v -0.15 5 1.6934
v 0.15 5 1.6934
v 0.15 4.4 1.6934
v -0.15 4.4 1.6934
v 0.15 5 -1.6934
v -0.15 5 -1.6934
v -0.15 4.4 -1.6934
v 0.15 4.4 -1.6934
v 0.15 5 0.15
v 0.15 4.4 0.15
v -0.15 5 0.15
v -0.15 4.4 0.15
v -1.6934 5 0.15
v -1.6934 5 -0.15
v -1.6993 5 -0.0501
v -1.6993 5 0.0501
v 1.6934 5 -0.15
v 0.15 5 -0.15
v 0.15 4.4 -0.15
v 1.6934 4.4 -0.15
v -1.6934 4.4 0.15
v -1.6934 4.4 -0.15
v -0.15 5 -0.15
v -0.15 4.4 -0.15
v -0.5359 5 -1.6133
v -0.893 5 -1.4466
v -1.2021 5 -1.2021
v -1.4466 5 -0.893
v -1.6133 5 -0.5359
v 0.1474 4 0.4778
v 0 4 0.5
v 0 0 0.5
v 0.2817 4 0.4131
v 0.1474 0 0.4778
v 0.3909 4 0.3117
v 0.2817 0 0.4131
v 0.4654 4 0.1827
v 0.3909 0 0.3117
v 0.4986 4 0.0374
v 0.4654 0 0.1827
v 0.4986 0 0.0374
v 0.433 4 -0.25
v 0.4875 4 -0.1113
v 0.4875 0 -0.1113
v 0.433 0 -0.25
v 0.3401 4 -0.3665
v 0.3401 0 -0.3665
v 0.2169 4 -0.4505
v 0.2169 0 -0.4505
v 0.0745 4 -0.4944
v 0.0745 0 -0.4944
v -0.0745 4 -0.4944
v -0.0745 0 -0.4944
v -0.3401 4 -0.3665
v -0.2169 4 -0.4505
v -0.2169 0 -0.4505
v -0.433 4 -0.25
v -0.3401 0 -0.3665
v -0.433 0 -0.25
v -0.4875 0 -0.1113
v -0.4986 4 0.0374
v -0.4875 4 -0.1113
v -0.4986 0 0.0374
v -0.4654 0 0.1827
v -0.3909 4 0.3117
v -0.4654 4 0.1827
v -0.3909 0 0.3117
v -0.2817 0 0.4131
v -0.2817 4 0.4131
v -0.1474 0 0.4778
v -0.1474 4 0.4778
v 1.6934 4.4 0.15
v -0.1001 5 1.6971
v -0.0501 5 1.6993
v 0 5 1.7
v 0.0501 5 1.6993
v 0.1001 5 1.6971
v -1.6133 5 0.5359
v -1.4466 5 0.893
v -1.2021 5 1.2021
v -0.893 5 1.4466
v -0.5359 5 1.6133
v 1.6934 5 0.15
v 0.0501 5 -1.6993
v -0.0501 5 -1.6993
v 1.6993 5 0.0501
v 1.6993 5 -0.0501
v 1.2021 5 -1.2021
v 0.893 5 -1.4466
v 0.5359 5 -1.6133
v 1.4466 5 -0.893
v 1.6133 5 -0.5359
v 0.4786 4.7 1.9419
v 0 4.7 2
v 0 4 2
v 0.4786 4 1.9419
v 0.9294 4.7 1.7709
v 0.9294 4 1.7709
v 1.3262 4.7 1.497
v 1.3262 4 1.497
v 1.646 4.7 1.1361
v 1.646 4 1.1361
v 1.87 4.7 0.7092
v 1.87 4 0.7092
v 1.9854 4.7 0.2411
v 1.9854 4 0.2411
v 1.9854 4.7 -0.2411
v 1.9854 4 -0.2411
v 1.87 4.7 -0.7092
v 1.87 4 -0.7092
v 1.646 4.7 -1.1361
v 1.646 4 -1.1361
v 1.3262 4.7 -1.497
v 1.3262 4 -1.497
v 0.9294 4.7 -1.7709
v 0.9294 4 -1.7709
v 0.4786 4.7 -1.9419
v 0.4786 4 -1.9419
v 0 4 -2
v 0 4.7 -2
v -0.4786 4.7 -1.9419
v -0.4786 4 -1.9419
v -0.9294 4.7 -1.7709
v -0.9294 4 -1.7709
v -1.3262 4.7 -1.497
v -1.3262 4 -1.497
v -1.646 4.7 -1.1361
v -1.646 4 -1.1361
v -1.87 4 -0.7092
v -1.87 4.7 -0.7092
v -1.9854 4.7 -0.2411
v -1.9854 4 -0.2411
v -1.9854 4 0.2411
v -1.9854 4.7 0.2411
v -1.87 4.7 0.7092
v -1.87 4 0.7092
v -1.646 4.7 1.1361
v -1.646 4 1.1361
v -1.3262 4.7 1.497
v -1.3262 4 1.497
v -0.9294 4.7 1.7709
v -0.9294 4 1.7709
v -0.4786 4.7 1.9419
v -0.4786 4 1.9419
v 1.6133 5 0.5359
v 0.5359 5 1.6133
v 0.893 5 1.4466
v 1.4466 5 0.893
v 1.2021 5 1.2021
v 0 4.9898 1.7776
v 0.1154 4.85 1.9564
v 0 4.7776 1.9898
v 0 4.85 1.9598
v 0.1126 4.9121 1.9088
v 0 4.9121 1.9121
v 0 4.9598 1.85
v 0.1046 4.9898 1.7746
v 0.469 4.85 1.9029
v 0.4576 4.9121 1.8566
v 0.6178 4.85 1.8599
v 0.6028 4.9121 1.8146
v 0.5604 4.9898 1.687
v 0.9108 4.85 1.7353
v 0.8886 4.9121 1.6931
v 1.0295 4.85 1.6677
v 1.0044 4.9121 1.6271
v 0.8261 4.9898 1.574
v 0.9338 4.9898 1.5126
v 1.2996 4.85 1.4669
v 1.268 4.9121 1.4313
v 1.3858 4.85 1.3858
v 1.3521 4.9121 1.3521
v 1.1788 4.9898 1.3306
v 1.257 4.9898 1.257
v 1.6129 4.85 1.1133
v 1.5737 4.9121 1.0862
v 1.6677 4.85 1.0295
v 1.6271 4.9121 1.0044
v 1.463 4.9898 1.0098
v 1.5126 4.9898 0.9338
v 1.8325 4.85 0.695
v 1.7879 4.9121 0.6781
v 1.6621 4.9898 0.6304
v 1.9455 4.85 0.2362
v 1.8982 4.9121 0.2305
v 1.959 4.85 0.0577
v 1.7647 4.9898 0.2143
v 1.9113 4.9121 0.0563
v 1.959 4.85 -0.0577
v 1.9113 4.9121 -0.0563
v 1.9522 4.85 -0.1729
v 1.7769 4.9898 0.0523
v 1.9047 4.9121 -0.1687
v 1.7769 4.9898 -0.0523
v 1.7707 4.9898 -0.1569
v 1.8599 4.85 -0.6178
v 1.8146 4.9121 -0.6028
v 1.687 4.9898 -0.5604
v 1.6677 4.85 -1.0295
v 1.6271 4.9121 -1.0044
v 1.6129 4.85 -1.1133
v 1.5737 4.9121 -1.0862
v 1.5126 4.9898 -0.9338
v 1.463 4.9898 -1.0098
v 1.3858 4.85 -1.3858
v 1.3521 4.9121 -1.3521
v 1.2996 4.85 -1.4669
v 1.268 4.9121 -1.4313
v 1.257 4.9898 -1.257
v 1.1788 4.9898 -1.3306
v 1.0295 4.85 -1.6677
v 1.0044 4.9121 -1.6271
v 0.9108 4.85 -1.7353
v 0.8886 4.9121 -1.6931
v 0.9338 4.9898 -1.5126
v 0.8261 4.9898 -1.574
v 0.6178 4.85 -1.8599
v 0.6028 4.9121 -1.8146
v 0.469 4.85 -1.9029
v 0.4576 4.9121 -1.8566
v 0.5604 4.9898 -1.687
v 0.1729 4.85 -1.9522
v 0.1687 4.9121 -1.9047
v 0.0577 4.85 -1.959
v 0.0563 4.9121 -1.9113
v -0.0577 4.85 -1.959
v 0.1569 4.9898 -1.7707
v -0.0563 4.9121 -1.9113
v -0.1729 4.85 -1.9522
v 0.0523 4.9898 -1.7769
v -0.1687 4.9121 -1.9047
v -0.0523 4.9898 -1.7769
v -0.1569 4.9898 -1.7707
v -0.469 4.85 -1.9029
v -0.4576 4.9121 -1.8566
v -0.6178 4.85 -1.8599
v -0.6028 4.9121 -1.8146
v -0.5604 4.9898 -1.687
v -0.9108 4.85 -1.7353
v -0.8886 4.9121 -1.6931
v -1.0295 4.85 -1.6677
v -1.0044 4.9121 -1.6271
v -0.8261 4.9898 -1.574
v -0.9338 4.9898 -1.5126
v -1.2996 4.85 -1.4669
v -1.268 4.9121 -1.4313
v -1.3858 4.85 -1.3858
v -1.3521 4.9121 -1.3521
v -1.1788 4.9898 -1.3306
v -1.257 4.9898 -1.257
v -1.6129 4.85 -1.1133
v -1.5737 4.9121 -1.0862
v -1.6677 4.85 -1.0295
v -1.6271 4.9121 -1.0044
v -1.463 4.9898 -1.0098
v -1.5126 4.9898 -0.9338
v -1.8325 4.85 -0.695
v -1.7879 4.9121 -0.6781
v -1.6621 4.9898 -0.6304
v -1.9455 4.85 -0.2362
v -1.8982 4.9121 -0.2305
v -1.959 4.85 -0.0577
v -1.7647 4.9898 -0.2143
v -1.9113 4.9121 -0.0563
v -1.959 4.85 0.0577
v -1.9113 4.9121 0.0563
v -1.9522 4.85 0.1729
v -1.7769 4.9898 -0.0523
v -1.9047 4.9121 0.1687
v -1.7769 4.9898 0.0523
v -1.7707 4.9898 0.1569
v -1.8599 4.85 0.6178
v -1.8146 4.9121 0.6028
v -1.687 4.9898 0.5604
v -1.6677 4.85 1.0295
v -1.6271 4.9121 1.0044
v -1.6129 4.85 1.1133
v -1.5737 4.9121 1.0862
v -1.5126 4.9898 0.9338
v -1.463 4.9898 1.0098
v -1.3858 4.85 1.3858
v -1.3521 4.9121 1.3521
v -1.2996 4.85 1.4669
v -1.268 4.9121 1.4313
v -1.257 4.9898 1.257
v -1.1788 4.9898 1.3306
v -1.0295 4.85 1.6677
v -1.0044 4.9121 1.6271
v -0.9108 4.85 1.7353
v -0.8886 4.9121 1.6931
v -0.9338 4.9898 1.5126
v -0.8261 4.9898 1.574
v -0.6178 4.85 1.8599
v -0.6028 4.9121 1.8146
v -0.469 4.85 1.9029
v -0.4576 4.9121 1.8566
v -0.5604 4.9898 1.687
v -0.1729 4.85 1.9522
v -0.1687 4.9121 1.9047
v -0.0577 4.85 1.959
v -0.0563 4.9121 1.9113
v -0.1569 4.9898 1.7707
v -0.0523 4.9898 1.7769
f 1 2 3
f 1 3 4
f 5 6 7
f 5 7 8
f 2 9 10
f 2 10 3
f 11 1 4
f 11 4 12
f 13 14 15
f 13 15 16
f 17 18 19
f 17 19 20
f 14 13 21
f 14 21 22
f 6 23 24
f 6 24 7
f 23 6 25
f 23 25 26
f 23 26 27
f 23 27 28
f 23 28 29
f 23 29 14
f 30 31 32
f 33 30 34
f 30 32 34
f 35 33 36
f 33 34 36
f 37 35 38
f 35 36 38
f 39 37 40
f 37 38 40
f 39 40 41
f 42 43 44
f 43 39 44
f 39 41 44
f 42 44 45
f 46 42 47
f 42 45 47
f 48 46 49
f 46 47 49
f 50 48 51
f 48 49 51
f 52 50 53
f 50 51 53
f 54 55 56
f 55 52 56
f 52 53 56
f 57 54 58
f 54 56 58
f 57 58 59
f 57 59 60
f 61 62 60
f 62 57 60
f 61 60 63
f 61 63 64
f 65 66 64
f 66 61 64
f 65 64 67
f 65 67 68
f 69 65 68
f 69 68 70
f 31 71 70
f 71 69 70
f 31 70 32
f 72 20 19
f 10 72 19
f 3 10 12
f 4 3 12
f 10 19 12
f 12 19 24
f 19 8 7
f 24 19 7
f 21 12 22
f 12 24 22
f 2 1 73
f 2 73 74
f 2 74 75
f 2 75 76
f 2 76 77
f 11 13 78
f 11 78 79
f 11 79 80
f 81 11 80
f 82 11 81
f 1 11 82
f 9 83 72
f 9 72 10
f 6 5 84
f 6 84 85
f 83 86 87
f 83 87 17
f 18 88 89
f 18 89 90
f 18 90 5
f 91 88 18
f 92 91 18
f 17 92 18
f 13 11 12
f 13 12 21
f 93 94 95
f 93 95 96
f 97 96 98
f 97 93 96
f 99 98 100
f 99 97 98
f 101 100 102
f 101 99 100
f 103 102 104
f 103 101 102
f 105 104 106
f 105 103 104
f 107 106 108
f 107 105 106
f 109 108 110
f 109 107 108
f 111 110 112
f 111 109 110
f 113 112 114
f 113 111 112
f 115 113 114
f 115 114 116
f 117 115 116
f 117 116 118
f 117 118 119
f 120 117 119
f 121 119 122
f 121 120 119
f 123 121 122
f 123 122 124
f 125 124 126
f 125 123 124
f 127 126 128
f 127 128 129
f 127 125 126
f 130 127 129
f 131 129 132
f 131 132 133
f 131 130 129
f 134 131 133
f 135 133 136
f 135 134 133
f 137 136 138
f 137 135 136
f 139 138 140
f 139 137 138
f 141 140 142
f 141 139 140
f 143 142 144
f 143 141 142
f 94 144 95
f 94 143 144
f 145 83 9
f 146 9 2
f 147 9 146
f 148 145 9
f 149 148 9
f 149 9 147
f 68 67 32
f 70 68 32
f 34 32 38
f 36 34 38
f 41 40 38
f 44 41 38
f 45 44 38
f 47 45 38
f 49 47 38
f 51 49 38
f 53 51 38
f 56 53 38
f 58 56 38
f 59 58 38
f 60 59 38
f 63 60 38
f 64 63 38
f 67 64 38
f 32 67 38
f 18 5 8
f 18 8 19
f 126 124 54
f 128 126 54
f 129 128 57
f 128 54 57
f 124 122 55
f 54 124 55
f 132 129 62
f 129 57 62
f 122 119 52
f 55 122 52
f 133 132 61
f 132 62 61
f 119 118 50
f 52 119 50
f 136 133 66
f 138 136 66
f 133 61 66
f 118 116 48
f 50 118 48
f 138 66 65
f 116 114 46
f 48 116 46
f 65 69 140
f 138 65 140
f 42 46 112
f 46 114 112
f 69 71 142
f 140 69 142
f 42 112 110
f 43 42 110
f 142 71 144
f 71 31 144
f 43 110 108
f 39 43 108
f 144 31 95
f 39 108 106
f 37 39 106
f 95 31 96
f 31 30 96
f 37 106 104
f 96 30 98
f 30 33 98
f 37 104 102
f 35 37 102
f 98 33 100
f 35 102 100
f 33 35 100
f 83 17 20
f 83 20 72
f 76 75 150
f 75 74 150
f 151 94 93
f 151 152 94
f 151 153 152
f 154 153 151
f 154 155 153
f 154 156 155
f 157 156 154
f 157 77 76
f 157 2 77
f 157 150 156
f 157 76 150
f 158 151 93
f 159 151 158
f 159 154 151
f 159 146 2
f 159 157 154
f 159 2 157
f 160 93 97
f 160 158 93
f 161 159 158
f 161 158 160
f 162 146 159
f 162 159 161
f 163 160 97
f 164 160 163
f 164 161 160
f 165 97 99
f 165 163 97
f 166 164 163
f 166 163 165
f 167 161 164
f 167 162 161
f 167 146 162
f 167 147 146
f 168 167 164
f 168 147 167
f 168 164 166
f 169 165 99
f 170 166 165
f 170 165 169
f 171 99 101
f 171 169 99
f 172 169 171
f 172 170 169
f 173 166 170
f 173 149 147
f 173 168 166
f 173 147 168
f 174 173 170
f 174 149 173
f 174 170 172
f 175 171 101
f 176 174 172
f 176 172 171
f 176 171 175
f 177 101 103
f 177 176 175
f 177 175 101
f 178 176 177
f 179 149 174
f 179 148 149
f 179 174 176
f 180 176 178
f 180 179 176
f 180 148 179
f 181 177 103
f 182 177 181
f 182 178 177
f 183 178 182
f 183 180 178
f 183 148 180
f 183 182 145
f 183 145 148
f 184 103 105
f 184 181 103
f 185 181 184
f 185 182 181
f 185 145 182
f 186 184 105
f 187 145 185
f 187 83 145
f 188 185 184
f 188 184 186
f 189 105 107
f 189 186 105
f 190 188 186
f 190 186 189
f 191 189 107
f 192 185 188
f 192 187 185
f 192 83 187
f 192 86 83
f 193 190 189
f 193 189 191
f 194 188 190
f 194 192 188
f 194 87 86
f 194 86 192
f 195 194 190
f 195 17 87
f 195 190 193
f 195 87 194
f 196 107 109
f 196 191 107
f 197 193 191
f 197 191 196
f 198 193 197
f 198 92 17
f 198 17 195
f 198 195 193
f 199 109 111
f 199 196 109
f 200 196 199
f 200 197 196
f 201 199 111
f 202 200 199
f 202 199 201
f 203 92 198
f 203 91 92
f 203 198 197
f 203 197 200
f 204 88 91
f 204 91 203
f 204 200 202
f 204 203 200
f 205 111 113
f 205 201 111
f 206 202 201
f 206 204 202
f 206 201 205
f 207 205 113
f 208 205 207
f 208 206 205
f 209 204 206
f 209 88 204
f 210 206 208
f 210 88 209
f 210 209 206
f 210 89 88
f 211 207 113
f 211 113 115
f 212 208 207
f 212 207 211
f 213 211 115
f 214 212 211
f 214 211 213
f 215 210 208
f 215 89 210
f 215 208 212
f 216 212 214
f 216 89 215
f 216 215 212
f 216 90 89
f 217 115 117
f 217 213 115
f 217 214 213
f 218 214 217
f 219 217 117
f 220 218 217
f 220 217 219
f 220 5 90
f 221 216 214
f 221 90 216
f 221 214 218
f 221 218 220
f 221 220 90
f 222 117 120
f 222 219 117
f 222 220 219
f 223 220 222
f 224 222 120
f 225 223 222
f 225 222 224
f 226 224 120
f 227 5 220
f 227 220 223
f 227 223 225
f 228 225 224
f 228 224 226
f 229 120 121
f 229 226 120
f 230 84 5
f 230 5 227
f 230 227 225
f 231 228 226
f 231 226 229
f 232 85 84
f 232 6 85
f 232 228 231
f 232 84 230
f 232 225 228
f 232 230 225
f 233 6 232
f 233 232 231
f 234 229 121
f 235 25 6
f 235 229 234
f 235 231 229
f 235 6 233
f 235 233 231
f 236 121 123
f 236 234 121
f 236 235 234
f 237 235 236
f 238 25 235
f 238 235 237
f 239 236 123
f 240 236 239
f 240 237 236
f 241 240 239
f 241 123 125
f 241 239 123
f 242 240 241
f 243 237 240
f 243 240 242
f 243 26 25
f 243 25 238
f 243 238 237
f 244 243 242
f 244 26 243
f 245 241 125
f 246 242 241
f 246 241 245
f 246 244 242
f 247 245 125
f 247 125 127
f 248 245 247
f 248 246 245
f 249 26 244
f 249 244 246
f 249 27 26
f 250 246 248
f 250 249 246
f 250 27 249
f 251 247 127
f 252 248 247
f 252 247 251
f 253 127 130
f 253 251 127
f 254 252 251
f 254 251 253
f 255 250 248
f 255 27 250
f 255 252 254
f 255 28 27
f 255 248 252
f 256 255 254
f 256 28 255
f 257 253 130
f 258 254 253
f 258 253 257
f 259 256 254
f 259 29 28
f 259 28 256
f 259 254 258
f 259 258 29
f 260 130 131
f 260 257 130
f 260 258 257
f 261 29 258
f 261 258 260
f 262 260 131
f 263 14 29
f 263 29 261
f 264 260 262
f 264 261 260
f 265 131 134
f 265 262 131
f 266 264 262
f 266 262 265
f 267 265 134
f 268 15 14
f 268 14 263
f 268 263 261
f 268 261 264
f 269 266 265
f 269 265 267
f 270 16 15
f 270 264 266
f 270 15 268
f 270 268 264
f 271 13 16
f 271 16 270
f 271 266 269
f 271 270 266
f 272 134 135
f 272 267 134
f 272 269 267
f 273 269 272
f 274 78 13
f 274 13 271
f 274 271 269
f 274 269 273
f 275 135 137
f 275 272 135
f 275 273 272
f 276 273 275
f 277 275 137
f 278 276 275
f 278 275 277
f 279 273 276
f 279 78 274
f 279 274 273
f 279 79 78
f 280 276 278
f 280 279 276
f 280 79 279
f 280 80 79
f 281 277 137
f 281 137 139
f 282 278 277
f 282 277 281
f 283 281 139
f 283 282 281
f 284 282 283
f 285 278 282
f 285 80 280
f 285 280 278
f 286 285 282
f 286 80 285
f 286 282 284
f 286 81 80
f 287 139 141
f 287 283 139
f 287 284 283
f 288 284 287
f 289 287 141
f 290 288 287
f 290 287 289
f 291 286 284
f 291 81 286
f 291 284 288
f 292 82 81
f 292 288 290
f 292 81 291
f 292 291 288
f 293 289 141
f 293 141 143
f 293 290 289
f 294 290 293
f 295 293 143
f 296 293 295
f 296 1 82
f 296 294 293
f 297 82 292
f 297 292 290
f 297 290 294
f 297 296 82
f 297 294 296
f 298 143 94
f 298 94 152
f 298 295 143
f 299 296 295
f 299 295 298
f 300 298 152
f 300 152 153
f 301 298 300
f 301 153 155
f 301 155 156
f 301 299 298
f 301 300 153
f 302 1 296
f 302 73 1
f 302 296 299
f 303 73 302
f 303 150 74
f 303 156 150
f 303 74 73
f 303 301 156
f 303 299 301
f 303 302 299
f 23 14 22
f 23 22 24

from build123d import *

# Parameters (mm, degrees)
SKETCH1_R           = 0.5
BOSS_EXTRUDE1_DEPTH = 5
SKETCH2_R           = 2
BOSS_EXTRUDE2_DEPTH = 1
FILLET1_R           = 0.3
CUT_EXTRUDE2_DEPTH  = 0.6


with BuildPart() as part:
    # Sketch1 → Boss-Extrude1 (new body)
    with BuildSketch(Plane(origin=(0, 0, 0), x_dir=(1, 0, 0), z_dir=(0, 1, 0))):
        with Locations(Location((0, 0, 0), (0, 0, 270))):
            Circle(SKETCH1_R)
    extrude(amount=BOSS_EXTRUDE1_DEPTH)

    # Sketch2 → Boss-Extrude2 (add)
    with BuildSketch(Plane(origin=(0, 5, 0), x_dir=(1, 0, 0), z_dir=(0, 1, 0))):
        with Locations(Location((0, 0, 0), (0, 0, 270))):
            Circle(SKETCH2_R)
    extrude(amount=-BOSS_EXTRUDE2_DEPTH)

    # Fillet1
    fillet1_edges = [part.edges().sort_by_distance(p)[0] for p in [
        (0, 5, -2),
    ]]
    fillet(fillet1_edges, radius=FILLET1_R)

    # Sketch3 → Cut-Extrude2 (cut)
    with BuildSketch(Plane(origin=(0, 5, 0), x_dir=(1, 0, 0), z_dir=(0, 1, 0))):
        Polygon((-0.15, 0.15), (-0.15, 1.693369422), (0.15, 1.693369422), (0.15, 0.15), (1.693369422, 0.15), (1.693369422, -0.15), (0.15, -0.15), (0.15, -1.693369422), (-0.15, -1.693369422), (-0.15, -0.15), (-1.693369422, -0.15), (-1.693369422, 0.15), align=None)
    extrude(amount=-CUT_EXTRUDE2_DEPTH, mode=Mode.SUBTRACT)


solid = part.part
